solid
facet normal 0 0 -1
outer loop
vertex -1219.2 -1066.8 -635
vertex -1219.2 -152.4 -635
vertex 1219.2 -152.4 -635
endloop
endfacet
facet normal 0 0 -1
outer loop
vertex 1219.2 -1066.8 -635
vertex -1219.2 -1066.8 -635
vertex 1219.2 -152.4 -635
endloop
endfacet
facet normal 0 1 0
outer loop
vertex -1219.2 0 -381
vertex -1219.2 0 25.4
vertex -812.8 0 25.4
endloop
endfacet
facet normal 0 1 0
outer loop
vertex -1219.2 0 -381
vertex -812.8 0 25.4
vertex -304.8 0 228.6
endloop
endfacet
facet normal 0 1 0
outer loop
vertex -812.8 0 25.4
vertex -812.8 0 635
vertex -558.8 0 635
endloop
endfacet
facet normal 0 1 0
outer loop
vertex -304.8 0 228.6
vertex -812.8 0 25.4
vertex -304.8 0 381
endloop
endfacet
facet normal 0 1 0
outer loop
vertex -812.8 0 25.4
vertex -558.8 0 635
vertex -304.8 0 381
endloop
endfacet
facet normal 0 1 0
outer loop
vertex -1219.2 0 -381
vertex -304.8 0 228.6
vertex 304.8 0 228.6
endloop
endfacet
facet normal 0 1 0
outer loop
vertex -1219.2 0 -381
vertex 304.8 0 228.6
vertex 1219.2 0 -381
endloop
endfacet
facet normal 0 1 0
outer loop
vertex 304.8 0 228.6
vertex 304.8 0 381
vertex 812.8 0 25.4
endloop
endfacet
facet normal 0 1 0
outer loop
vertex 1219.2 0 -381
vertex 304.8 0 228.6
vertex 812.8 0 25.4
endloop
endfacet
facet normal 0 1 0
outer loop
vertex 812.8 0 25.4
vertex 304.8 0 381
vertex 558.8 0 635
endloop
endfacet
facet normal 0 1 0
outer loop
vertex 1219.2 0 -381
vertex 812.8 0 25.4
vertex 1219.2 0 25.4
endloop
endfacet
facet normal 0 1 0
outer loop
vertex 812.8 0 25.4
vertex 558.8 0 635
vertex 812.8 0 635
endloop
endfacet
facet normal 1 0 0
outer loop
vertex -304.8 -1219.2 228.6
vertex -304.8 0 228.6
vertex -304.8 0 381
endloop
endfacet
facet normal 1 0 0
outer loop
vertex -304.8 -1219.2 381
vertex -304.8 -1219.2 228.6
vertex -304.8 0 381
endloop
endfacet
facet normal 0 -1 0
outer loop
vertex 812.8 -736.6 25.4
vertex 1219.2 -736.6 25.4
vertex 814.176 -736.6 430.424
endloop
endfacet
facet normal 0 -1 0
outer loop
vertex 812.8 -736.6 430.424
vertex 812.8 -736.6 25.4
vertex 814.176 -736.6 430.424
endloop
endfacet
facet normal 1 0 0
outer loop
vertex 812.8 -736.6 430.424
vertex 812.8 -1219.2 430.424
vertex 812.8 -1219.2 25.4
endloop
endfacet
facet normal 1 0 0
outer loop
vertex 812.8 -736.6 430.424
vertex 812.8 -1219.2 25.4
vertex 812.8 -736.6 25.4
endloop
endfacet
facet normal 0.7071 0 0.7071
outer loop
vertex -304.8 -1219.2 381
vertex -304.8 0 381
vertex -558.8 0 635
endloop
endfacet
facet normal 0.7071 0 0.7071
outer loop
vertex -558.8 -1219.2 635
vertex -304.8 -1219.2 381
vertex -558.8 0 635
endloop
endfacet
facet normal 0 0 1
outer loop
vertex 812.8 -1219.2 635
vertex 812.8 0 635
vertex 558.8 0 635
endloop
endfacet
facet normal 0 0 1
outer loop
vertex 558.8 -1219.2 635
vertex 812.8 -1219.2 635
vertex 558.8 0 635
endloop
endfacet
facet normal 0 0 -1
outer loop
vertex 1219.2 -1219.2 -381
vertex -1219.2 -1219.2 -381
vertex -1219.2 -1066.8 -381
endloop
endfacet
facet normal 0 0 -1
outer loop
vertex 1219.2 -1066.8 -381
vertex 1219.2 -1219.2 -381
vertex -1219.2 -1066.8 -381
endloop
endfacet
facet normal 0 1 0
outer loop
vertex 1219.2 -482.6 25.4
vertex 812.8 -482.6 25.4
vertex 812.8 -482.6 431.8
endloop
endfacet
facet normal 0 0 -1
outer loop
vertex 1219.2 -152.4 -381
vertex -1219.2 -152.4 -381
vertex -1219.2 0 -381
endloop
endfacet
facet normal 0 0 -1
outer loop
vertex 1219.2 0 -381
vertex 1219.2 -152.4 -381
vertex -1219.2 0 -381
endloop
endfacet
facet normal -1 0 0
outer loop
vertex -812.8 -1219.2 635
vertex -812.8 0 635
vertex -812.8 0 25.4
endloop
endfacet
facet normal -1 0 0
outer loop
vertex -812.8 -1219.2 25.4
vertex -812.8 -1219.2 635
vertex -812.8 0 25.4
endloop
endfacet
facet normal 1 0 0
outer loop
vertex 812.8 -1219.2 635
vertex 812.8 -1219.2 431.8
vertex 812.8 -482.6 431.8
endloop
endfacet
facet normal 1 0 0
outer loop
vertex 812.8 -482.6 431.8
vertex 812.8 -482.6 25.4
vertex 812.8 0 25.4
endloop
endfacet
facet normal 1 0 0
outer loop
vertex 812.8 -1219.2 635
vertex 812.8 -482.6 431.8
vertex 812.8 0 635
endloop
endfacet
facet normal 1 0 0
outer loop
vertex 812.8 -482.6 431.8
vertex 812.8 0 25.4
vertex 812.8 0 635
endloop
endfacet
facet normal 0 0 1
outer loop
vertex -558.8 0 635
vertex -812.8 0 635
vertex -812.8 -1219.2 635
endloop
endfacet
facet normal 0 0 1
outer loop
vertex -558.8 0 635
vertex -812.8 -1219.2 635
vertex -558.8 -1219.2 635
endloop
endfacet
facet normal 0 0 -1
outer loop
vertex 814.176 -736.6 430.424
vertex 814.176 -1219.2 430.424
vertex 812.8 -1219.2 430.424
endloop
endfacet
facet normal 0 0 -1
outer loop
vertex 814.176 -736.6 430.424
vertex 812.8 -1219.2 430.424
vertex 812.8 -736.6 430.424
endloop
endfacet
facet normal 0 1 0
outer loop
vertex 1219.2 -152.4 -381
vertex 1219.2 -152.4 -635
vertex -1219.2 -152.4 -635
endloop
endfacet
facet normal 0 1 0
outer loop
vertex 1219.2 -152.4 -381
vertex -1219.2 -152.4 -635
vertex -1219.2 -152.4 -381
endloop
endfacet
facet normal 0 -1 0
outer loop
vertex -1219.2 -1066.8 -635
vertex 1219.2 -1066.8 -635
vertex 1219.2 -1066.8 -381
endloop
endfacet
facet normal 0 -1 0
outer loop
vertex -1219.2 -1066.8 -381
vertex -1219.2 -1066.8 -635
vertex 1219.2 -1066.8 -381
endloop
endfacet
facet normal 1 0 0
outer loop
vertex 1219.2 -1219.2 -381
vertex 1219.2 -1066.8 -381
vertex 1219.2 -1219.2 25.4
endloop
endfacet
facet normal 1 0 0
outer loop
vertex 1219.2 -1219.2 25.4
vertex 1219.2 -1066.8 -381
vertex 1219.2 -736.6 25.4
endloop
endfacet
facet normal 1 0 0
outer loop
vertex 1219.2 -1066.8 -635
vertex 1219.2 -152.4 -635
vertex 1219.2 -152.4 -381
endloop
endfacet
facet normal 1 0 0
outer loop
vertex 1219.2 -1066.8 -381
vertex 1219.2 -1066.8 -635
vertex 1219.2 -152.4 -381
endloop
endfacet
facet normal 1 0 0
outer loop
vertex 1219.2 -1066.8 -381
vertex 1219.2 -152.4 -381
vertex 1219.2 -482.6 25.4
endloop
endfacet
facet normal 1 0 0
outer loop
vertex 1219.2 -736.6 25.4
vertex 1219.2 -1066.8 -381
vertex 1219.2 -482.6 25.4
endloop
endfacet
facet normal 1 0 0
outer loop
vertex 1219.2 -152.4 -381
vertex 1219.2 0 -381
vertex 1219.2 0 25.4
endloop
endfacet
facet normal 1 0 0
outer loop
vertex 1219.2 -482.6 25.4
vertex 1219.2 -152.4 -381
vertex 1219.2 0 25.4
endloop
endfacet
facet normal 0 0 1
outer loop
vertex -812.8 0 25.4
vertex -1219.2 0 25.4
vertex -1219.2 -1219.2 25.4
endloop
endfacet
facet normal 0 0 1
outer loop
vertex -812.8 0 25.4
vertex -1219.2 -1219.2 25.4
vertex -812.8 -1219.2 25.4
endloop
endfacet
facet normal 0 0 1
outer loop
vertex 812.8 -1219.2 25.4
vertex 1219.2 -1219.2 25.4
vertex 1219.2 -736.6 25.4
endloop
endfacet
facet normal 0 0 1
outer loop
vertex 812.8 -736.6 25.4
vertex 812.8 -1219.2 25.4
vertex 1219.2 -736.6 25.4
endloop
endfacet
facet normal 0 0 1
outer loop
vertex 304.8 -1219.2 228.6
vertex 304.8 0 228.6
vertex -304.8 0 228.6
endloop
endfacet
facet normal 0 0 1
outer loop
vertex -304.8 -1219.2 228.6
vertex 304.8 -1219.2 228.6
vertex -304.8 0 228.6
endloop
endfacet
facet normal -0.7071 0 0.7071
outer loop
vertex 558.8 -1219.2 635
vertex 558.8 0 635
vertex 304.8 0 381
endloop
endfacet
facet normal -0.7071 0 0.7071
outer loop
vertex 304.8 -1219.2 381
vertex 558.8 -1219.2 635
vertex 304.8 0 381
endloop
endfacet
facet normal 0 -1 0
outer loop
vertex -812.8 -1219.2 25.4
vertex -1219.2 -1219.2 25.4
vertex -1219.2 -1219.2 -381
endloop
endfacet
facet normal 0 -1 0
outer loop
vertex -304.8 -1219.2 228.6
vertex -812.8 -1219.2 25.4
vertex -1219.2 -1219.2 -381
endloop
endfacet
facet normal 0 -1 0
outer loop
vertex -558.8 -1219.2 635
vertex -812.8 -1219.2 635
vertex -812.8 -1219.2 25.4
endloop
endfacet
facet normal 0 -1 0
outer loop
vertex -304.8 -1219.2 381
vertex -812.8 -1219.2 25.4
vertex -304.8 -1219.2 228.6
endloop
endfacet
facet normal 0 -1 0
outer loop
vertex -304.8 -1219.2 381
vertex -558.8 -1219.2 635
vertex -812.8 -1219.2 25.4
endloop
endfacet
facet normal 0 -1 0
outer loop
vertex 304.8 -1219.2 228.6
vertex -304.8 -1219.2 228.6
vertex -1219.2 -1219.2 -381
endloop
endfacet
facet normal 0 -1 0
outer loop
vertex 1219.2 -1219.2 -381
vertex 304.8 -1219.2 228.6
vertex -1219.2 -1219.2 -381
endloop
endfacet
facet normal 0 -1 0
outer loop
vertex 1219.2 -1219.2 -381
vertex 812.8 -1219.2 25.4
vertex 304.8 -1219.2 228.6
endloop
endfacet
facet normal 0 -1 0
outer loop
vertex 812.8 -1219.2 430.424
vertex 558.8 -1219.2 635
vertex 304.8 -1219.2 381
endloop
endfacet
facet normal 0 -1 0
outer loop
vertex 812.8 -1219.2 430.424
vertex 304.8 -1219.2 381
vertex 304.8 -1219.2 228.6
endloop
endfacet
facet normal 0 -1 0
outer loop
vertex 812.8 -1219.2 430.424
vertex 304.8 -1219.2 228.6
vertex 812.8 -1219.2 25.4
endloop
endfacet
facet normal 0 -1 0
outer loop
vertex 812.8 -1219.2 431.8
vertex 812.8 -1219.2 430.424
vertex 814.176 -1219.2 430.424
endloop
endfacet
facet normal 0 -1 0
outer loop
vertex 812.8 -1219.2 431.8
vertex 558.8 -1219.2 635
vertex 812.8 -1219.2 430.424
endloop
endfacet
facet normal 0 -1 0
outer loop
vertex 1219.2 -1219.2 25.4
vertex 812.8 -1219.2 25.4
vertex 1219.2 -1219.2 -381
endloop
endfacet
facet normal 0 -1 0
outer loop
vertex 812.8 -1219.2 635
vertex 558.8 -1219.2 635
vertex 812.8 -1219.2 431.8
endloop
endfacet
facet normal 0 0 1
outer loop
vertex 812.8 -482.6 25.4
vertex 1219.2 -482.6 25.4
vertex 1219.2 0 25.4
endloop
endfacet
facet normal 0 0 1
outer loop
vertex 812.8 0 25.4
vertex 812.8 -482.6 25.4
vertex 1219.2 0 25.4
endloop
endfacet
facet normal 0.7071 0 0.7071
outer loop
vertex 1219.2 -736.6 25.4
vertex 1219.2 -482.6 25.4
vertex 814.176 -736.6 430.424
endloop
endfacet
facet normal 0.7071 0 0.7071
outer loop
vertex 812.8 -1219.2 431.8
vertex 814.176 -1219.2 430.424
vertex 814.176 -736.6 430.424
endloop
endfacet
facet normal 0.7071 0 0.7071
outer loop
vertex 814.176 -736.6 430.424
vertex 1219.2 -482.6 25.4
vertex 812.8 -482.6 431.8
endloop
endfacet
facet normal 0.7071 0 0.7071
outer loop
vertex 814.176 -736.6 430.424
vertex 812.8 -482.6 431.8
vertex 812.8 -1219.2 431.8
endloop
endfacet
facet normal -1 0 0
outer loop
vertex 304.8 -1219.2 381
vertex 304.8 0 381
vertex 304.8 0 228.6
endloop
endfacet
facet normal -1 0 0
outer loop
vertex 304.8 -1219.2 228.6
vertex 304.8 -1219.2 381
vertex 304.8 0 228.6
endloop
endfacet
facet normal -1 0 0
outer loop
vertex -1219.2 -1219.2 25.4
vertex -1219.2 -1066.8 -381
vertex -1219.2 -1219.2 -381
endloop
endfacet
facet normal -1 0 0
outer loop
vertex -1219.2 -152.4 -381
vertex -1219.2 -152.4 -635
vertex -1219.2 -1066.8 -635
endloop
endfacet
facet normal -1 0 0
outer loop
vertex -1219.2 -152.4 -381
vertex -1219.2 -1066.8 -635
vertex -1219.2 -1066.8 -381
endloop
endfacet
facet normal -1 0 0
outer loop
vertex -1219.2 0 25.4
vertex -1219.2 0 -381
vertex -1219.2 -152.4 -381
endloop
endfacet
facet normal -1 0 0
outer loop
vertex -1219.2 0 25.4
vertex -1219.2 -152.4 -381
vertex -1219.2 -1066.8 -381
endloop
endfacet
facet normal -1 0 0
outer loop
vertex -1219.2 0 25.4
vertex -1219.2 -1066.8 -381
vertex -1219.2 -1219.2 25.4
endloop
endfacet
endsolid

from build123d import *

# Parameters (mm, degrees)
F0_W     = 406.4
F0_H     = 660.4
F0_W_2   = 254
F0_H_2   = 406.4
F0_H_3   = 863.6
F1_DEPTH = 1219.2
F2_W     = 152.4
F2_H     = 254
F3_DEPTH = 2438.4
F4_W     = 482.6
F4_H     = 406.5058358669
F4_H_2   = 405.0241538048
F5_DEPTH = 406.4


with BuildPart() as f1:
    # F0 (on Front) → F1 (new body)
    with BuildSketch(Plane.XZ):
        with Locations((-1016, -304.8)):
            Rectangle(F0_W, F0_H)
        Polygon((-558.8, 228.6), (-812.8, 228.6), (-812.8, 25.4), (-812.8, -635), (-558.8, -635), align=None)
        with Locations((-685.8, 431.8)):
            Rectangle(F0_W_2, F0_H_2)
        Polygon((-304.8, 381), (-558.8, 635), (-558.8, 228.6), (-304.8, 228.6), align=None)
        with Locations((-431.8, -203.2)):
            Rectangle(F0_W_2, F0_H_3)
        Polygon((-152.4, 228.6), (-304.8, 228.6), (-304.8, -635), (304.8, -635), (304.8, 228.6), align=None)
        Polygon((558.8, -635), (558.8, 635), (304.8, 381), (304.8, 228.6), (304.8, -635), align=None)
        Polygon((812.8, 635), (558.8, 635), (558.8, -635), (812.8, -635), (812.8, 25.4), (812.8, 431.8), align=None)
        Polygon((1219.2, 25.4), (812.8, 431.8), (812.8, 25.4), align=None)
        with Locations((1016, -304.8)):
            Rectangle(F0_W, F0_H)
    extrude(amount=F1_DEPTH)

    # F2 (on face) → F3 (cut)
    with BuildSketch(Plane.YZ.offset(1219.2)):
        with Locations((-1143, -508)):
            Rectangle(F2_W, F2_H)
        with Locations((-76.2, -508)):
            Rectangle(F2_W, F2_H)
    extrude(amount=-F3_DEPTH, mode=Mode.SUBTRACT)

    # F4 (on face) → F5 (cut)
    with BuildSketch(Plane.YZ.offset(1219.2)):
        with Locations((-241.3, 228.6529179335)):
            Rectangle(F4_W, F4_H)
        with Locations((-977.9, 227.9120769024)):
            Rectangle(F4_W, F4_H_2)
    extrude(amount=-F5_DEPTH, mode=Mode.SUBTRACT)


solid = f1.part
